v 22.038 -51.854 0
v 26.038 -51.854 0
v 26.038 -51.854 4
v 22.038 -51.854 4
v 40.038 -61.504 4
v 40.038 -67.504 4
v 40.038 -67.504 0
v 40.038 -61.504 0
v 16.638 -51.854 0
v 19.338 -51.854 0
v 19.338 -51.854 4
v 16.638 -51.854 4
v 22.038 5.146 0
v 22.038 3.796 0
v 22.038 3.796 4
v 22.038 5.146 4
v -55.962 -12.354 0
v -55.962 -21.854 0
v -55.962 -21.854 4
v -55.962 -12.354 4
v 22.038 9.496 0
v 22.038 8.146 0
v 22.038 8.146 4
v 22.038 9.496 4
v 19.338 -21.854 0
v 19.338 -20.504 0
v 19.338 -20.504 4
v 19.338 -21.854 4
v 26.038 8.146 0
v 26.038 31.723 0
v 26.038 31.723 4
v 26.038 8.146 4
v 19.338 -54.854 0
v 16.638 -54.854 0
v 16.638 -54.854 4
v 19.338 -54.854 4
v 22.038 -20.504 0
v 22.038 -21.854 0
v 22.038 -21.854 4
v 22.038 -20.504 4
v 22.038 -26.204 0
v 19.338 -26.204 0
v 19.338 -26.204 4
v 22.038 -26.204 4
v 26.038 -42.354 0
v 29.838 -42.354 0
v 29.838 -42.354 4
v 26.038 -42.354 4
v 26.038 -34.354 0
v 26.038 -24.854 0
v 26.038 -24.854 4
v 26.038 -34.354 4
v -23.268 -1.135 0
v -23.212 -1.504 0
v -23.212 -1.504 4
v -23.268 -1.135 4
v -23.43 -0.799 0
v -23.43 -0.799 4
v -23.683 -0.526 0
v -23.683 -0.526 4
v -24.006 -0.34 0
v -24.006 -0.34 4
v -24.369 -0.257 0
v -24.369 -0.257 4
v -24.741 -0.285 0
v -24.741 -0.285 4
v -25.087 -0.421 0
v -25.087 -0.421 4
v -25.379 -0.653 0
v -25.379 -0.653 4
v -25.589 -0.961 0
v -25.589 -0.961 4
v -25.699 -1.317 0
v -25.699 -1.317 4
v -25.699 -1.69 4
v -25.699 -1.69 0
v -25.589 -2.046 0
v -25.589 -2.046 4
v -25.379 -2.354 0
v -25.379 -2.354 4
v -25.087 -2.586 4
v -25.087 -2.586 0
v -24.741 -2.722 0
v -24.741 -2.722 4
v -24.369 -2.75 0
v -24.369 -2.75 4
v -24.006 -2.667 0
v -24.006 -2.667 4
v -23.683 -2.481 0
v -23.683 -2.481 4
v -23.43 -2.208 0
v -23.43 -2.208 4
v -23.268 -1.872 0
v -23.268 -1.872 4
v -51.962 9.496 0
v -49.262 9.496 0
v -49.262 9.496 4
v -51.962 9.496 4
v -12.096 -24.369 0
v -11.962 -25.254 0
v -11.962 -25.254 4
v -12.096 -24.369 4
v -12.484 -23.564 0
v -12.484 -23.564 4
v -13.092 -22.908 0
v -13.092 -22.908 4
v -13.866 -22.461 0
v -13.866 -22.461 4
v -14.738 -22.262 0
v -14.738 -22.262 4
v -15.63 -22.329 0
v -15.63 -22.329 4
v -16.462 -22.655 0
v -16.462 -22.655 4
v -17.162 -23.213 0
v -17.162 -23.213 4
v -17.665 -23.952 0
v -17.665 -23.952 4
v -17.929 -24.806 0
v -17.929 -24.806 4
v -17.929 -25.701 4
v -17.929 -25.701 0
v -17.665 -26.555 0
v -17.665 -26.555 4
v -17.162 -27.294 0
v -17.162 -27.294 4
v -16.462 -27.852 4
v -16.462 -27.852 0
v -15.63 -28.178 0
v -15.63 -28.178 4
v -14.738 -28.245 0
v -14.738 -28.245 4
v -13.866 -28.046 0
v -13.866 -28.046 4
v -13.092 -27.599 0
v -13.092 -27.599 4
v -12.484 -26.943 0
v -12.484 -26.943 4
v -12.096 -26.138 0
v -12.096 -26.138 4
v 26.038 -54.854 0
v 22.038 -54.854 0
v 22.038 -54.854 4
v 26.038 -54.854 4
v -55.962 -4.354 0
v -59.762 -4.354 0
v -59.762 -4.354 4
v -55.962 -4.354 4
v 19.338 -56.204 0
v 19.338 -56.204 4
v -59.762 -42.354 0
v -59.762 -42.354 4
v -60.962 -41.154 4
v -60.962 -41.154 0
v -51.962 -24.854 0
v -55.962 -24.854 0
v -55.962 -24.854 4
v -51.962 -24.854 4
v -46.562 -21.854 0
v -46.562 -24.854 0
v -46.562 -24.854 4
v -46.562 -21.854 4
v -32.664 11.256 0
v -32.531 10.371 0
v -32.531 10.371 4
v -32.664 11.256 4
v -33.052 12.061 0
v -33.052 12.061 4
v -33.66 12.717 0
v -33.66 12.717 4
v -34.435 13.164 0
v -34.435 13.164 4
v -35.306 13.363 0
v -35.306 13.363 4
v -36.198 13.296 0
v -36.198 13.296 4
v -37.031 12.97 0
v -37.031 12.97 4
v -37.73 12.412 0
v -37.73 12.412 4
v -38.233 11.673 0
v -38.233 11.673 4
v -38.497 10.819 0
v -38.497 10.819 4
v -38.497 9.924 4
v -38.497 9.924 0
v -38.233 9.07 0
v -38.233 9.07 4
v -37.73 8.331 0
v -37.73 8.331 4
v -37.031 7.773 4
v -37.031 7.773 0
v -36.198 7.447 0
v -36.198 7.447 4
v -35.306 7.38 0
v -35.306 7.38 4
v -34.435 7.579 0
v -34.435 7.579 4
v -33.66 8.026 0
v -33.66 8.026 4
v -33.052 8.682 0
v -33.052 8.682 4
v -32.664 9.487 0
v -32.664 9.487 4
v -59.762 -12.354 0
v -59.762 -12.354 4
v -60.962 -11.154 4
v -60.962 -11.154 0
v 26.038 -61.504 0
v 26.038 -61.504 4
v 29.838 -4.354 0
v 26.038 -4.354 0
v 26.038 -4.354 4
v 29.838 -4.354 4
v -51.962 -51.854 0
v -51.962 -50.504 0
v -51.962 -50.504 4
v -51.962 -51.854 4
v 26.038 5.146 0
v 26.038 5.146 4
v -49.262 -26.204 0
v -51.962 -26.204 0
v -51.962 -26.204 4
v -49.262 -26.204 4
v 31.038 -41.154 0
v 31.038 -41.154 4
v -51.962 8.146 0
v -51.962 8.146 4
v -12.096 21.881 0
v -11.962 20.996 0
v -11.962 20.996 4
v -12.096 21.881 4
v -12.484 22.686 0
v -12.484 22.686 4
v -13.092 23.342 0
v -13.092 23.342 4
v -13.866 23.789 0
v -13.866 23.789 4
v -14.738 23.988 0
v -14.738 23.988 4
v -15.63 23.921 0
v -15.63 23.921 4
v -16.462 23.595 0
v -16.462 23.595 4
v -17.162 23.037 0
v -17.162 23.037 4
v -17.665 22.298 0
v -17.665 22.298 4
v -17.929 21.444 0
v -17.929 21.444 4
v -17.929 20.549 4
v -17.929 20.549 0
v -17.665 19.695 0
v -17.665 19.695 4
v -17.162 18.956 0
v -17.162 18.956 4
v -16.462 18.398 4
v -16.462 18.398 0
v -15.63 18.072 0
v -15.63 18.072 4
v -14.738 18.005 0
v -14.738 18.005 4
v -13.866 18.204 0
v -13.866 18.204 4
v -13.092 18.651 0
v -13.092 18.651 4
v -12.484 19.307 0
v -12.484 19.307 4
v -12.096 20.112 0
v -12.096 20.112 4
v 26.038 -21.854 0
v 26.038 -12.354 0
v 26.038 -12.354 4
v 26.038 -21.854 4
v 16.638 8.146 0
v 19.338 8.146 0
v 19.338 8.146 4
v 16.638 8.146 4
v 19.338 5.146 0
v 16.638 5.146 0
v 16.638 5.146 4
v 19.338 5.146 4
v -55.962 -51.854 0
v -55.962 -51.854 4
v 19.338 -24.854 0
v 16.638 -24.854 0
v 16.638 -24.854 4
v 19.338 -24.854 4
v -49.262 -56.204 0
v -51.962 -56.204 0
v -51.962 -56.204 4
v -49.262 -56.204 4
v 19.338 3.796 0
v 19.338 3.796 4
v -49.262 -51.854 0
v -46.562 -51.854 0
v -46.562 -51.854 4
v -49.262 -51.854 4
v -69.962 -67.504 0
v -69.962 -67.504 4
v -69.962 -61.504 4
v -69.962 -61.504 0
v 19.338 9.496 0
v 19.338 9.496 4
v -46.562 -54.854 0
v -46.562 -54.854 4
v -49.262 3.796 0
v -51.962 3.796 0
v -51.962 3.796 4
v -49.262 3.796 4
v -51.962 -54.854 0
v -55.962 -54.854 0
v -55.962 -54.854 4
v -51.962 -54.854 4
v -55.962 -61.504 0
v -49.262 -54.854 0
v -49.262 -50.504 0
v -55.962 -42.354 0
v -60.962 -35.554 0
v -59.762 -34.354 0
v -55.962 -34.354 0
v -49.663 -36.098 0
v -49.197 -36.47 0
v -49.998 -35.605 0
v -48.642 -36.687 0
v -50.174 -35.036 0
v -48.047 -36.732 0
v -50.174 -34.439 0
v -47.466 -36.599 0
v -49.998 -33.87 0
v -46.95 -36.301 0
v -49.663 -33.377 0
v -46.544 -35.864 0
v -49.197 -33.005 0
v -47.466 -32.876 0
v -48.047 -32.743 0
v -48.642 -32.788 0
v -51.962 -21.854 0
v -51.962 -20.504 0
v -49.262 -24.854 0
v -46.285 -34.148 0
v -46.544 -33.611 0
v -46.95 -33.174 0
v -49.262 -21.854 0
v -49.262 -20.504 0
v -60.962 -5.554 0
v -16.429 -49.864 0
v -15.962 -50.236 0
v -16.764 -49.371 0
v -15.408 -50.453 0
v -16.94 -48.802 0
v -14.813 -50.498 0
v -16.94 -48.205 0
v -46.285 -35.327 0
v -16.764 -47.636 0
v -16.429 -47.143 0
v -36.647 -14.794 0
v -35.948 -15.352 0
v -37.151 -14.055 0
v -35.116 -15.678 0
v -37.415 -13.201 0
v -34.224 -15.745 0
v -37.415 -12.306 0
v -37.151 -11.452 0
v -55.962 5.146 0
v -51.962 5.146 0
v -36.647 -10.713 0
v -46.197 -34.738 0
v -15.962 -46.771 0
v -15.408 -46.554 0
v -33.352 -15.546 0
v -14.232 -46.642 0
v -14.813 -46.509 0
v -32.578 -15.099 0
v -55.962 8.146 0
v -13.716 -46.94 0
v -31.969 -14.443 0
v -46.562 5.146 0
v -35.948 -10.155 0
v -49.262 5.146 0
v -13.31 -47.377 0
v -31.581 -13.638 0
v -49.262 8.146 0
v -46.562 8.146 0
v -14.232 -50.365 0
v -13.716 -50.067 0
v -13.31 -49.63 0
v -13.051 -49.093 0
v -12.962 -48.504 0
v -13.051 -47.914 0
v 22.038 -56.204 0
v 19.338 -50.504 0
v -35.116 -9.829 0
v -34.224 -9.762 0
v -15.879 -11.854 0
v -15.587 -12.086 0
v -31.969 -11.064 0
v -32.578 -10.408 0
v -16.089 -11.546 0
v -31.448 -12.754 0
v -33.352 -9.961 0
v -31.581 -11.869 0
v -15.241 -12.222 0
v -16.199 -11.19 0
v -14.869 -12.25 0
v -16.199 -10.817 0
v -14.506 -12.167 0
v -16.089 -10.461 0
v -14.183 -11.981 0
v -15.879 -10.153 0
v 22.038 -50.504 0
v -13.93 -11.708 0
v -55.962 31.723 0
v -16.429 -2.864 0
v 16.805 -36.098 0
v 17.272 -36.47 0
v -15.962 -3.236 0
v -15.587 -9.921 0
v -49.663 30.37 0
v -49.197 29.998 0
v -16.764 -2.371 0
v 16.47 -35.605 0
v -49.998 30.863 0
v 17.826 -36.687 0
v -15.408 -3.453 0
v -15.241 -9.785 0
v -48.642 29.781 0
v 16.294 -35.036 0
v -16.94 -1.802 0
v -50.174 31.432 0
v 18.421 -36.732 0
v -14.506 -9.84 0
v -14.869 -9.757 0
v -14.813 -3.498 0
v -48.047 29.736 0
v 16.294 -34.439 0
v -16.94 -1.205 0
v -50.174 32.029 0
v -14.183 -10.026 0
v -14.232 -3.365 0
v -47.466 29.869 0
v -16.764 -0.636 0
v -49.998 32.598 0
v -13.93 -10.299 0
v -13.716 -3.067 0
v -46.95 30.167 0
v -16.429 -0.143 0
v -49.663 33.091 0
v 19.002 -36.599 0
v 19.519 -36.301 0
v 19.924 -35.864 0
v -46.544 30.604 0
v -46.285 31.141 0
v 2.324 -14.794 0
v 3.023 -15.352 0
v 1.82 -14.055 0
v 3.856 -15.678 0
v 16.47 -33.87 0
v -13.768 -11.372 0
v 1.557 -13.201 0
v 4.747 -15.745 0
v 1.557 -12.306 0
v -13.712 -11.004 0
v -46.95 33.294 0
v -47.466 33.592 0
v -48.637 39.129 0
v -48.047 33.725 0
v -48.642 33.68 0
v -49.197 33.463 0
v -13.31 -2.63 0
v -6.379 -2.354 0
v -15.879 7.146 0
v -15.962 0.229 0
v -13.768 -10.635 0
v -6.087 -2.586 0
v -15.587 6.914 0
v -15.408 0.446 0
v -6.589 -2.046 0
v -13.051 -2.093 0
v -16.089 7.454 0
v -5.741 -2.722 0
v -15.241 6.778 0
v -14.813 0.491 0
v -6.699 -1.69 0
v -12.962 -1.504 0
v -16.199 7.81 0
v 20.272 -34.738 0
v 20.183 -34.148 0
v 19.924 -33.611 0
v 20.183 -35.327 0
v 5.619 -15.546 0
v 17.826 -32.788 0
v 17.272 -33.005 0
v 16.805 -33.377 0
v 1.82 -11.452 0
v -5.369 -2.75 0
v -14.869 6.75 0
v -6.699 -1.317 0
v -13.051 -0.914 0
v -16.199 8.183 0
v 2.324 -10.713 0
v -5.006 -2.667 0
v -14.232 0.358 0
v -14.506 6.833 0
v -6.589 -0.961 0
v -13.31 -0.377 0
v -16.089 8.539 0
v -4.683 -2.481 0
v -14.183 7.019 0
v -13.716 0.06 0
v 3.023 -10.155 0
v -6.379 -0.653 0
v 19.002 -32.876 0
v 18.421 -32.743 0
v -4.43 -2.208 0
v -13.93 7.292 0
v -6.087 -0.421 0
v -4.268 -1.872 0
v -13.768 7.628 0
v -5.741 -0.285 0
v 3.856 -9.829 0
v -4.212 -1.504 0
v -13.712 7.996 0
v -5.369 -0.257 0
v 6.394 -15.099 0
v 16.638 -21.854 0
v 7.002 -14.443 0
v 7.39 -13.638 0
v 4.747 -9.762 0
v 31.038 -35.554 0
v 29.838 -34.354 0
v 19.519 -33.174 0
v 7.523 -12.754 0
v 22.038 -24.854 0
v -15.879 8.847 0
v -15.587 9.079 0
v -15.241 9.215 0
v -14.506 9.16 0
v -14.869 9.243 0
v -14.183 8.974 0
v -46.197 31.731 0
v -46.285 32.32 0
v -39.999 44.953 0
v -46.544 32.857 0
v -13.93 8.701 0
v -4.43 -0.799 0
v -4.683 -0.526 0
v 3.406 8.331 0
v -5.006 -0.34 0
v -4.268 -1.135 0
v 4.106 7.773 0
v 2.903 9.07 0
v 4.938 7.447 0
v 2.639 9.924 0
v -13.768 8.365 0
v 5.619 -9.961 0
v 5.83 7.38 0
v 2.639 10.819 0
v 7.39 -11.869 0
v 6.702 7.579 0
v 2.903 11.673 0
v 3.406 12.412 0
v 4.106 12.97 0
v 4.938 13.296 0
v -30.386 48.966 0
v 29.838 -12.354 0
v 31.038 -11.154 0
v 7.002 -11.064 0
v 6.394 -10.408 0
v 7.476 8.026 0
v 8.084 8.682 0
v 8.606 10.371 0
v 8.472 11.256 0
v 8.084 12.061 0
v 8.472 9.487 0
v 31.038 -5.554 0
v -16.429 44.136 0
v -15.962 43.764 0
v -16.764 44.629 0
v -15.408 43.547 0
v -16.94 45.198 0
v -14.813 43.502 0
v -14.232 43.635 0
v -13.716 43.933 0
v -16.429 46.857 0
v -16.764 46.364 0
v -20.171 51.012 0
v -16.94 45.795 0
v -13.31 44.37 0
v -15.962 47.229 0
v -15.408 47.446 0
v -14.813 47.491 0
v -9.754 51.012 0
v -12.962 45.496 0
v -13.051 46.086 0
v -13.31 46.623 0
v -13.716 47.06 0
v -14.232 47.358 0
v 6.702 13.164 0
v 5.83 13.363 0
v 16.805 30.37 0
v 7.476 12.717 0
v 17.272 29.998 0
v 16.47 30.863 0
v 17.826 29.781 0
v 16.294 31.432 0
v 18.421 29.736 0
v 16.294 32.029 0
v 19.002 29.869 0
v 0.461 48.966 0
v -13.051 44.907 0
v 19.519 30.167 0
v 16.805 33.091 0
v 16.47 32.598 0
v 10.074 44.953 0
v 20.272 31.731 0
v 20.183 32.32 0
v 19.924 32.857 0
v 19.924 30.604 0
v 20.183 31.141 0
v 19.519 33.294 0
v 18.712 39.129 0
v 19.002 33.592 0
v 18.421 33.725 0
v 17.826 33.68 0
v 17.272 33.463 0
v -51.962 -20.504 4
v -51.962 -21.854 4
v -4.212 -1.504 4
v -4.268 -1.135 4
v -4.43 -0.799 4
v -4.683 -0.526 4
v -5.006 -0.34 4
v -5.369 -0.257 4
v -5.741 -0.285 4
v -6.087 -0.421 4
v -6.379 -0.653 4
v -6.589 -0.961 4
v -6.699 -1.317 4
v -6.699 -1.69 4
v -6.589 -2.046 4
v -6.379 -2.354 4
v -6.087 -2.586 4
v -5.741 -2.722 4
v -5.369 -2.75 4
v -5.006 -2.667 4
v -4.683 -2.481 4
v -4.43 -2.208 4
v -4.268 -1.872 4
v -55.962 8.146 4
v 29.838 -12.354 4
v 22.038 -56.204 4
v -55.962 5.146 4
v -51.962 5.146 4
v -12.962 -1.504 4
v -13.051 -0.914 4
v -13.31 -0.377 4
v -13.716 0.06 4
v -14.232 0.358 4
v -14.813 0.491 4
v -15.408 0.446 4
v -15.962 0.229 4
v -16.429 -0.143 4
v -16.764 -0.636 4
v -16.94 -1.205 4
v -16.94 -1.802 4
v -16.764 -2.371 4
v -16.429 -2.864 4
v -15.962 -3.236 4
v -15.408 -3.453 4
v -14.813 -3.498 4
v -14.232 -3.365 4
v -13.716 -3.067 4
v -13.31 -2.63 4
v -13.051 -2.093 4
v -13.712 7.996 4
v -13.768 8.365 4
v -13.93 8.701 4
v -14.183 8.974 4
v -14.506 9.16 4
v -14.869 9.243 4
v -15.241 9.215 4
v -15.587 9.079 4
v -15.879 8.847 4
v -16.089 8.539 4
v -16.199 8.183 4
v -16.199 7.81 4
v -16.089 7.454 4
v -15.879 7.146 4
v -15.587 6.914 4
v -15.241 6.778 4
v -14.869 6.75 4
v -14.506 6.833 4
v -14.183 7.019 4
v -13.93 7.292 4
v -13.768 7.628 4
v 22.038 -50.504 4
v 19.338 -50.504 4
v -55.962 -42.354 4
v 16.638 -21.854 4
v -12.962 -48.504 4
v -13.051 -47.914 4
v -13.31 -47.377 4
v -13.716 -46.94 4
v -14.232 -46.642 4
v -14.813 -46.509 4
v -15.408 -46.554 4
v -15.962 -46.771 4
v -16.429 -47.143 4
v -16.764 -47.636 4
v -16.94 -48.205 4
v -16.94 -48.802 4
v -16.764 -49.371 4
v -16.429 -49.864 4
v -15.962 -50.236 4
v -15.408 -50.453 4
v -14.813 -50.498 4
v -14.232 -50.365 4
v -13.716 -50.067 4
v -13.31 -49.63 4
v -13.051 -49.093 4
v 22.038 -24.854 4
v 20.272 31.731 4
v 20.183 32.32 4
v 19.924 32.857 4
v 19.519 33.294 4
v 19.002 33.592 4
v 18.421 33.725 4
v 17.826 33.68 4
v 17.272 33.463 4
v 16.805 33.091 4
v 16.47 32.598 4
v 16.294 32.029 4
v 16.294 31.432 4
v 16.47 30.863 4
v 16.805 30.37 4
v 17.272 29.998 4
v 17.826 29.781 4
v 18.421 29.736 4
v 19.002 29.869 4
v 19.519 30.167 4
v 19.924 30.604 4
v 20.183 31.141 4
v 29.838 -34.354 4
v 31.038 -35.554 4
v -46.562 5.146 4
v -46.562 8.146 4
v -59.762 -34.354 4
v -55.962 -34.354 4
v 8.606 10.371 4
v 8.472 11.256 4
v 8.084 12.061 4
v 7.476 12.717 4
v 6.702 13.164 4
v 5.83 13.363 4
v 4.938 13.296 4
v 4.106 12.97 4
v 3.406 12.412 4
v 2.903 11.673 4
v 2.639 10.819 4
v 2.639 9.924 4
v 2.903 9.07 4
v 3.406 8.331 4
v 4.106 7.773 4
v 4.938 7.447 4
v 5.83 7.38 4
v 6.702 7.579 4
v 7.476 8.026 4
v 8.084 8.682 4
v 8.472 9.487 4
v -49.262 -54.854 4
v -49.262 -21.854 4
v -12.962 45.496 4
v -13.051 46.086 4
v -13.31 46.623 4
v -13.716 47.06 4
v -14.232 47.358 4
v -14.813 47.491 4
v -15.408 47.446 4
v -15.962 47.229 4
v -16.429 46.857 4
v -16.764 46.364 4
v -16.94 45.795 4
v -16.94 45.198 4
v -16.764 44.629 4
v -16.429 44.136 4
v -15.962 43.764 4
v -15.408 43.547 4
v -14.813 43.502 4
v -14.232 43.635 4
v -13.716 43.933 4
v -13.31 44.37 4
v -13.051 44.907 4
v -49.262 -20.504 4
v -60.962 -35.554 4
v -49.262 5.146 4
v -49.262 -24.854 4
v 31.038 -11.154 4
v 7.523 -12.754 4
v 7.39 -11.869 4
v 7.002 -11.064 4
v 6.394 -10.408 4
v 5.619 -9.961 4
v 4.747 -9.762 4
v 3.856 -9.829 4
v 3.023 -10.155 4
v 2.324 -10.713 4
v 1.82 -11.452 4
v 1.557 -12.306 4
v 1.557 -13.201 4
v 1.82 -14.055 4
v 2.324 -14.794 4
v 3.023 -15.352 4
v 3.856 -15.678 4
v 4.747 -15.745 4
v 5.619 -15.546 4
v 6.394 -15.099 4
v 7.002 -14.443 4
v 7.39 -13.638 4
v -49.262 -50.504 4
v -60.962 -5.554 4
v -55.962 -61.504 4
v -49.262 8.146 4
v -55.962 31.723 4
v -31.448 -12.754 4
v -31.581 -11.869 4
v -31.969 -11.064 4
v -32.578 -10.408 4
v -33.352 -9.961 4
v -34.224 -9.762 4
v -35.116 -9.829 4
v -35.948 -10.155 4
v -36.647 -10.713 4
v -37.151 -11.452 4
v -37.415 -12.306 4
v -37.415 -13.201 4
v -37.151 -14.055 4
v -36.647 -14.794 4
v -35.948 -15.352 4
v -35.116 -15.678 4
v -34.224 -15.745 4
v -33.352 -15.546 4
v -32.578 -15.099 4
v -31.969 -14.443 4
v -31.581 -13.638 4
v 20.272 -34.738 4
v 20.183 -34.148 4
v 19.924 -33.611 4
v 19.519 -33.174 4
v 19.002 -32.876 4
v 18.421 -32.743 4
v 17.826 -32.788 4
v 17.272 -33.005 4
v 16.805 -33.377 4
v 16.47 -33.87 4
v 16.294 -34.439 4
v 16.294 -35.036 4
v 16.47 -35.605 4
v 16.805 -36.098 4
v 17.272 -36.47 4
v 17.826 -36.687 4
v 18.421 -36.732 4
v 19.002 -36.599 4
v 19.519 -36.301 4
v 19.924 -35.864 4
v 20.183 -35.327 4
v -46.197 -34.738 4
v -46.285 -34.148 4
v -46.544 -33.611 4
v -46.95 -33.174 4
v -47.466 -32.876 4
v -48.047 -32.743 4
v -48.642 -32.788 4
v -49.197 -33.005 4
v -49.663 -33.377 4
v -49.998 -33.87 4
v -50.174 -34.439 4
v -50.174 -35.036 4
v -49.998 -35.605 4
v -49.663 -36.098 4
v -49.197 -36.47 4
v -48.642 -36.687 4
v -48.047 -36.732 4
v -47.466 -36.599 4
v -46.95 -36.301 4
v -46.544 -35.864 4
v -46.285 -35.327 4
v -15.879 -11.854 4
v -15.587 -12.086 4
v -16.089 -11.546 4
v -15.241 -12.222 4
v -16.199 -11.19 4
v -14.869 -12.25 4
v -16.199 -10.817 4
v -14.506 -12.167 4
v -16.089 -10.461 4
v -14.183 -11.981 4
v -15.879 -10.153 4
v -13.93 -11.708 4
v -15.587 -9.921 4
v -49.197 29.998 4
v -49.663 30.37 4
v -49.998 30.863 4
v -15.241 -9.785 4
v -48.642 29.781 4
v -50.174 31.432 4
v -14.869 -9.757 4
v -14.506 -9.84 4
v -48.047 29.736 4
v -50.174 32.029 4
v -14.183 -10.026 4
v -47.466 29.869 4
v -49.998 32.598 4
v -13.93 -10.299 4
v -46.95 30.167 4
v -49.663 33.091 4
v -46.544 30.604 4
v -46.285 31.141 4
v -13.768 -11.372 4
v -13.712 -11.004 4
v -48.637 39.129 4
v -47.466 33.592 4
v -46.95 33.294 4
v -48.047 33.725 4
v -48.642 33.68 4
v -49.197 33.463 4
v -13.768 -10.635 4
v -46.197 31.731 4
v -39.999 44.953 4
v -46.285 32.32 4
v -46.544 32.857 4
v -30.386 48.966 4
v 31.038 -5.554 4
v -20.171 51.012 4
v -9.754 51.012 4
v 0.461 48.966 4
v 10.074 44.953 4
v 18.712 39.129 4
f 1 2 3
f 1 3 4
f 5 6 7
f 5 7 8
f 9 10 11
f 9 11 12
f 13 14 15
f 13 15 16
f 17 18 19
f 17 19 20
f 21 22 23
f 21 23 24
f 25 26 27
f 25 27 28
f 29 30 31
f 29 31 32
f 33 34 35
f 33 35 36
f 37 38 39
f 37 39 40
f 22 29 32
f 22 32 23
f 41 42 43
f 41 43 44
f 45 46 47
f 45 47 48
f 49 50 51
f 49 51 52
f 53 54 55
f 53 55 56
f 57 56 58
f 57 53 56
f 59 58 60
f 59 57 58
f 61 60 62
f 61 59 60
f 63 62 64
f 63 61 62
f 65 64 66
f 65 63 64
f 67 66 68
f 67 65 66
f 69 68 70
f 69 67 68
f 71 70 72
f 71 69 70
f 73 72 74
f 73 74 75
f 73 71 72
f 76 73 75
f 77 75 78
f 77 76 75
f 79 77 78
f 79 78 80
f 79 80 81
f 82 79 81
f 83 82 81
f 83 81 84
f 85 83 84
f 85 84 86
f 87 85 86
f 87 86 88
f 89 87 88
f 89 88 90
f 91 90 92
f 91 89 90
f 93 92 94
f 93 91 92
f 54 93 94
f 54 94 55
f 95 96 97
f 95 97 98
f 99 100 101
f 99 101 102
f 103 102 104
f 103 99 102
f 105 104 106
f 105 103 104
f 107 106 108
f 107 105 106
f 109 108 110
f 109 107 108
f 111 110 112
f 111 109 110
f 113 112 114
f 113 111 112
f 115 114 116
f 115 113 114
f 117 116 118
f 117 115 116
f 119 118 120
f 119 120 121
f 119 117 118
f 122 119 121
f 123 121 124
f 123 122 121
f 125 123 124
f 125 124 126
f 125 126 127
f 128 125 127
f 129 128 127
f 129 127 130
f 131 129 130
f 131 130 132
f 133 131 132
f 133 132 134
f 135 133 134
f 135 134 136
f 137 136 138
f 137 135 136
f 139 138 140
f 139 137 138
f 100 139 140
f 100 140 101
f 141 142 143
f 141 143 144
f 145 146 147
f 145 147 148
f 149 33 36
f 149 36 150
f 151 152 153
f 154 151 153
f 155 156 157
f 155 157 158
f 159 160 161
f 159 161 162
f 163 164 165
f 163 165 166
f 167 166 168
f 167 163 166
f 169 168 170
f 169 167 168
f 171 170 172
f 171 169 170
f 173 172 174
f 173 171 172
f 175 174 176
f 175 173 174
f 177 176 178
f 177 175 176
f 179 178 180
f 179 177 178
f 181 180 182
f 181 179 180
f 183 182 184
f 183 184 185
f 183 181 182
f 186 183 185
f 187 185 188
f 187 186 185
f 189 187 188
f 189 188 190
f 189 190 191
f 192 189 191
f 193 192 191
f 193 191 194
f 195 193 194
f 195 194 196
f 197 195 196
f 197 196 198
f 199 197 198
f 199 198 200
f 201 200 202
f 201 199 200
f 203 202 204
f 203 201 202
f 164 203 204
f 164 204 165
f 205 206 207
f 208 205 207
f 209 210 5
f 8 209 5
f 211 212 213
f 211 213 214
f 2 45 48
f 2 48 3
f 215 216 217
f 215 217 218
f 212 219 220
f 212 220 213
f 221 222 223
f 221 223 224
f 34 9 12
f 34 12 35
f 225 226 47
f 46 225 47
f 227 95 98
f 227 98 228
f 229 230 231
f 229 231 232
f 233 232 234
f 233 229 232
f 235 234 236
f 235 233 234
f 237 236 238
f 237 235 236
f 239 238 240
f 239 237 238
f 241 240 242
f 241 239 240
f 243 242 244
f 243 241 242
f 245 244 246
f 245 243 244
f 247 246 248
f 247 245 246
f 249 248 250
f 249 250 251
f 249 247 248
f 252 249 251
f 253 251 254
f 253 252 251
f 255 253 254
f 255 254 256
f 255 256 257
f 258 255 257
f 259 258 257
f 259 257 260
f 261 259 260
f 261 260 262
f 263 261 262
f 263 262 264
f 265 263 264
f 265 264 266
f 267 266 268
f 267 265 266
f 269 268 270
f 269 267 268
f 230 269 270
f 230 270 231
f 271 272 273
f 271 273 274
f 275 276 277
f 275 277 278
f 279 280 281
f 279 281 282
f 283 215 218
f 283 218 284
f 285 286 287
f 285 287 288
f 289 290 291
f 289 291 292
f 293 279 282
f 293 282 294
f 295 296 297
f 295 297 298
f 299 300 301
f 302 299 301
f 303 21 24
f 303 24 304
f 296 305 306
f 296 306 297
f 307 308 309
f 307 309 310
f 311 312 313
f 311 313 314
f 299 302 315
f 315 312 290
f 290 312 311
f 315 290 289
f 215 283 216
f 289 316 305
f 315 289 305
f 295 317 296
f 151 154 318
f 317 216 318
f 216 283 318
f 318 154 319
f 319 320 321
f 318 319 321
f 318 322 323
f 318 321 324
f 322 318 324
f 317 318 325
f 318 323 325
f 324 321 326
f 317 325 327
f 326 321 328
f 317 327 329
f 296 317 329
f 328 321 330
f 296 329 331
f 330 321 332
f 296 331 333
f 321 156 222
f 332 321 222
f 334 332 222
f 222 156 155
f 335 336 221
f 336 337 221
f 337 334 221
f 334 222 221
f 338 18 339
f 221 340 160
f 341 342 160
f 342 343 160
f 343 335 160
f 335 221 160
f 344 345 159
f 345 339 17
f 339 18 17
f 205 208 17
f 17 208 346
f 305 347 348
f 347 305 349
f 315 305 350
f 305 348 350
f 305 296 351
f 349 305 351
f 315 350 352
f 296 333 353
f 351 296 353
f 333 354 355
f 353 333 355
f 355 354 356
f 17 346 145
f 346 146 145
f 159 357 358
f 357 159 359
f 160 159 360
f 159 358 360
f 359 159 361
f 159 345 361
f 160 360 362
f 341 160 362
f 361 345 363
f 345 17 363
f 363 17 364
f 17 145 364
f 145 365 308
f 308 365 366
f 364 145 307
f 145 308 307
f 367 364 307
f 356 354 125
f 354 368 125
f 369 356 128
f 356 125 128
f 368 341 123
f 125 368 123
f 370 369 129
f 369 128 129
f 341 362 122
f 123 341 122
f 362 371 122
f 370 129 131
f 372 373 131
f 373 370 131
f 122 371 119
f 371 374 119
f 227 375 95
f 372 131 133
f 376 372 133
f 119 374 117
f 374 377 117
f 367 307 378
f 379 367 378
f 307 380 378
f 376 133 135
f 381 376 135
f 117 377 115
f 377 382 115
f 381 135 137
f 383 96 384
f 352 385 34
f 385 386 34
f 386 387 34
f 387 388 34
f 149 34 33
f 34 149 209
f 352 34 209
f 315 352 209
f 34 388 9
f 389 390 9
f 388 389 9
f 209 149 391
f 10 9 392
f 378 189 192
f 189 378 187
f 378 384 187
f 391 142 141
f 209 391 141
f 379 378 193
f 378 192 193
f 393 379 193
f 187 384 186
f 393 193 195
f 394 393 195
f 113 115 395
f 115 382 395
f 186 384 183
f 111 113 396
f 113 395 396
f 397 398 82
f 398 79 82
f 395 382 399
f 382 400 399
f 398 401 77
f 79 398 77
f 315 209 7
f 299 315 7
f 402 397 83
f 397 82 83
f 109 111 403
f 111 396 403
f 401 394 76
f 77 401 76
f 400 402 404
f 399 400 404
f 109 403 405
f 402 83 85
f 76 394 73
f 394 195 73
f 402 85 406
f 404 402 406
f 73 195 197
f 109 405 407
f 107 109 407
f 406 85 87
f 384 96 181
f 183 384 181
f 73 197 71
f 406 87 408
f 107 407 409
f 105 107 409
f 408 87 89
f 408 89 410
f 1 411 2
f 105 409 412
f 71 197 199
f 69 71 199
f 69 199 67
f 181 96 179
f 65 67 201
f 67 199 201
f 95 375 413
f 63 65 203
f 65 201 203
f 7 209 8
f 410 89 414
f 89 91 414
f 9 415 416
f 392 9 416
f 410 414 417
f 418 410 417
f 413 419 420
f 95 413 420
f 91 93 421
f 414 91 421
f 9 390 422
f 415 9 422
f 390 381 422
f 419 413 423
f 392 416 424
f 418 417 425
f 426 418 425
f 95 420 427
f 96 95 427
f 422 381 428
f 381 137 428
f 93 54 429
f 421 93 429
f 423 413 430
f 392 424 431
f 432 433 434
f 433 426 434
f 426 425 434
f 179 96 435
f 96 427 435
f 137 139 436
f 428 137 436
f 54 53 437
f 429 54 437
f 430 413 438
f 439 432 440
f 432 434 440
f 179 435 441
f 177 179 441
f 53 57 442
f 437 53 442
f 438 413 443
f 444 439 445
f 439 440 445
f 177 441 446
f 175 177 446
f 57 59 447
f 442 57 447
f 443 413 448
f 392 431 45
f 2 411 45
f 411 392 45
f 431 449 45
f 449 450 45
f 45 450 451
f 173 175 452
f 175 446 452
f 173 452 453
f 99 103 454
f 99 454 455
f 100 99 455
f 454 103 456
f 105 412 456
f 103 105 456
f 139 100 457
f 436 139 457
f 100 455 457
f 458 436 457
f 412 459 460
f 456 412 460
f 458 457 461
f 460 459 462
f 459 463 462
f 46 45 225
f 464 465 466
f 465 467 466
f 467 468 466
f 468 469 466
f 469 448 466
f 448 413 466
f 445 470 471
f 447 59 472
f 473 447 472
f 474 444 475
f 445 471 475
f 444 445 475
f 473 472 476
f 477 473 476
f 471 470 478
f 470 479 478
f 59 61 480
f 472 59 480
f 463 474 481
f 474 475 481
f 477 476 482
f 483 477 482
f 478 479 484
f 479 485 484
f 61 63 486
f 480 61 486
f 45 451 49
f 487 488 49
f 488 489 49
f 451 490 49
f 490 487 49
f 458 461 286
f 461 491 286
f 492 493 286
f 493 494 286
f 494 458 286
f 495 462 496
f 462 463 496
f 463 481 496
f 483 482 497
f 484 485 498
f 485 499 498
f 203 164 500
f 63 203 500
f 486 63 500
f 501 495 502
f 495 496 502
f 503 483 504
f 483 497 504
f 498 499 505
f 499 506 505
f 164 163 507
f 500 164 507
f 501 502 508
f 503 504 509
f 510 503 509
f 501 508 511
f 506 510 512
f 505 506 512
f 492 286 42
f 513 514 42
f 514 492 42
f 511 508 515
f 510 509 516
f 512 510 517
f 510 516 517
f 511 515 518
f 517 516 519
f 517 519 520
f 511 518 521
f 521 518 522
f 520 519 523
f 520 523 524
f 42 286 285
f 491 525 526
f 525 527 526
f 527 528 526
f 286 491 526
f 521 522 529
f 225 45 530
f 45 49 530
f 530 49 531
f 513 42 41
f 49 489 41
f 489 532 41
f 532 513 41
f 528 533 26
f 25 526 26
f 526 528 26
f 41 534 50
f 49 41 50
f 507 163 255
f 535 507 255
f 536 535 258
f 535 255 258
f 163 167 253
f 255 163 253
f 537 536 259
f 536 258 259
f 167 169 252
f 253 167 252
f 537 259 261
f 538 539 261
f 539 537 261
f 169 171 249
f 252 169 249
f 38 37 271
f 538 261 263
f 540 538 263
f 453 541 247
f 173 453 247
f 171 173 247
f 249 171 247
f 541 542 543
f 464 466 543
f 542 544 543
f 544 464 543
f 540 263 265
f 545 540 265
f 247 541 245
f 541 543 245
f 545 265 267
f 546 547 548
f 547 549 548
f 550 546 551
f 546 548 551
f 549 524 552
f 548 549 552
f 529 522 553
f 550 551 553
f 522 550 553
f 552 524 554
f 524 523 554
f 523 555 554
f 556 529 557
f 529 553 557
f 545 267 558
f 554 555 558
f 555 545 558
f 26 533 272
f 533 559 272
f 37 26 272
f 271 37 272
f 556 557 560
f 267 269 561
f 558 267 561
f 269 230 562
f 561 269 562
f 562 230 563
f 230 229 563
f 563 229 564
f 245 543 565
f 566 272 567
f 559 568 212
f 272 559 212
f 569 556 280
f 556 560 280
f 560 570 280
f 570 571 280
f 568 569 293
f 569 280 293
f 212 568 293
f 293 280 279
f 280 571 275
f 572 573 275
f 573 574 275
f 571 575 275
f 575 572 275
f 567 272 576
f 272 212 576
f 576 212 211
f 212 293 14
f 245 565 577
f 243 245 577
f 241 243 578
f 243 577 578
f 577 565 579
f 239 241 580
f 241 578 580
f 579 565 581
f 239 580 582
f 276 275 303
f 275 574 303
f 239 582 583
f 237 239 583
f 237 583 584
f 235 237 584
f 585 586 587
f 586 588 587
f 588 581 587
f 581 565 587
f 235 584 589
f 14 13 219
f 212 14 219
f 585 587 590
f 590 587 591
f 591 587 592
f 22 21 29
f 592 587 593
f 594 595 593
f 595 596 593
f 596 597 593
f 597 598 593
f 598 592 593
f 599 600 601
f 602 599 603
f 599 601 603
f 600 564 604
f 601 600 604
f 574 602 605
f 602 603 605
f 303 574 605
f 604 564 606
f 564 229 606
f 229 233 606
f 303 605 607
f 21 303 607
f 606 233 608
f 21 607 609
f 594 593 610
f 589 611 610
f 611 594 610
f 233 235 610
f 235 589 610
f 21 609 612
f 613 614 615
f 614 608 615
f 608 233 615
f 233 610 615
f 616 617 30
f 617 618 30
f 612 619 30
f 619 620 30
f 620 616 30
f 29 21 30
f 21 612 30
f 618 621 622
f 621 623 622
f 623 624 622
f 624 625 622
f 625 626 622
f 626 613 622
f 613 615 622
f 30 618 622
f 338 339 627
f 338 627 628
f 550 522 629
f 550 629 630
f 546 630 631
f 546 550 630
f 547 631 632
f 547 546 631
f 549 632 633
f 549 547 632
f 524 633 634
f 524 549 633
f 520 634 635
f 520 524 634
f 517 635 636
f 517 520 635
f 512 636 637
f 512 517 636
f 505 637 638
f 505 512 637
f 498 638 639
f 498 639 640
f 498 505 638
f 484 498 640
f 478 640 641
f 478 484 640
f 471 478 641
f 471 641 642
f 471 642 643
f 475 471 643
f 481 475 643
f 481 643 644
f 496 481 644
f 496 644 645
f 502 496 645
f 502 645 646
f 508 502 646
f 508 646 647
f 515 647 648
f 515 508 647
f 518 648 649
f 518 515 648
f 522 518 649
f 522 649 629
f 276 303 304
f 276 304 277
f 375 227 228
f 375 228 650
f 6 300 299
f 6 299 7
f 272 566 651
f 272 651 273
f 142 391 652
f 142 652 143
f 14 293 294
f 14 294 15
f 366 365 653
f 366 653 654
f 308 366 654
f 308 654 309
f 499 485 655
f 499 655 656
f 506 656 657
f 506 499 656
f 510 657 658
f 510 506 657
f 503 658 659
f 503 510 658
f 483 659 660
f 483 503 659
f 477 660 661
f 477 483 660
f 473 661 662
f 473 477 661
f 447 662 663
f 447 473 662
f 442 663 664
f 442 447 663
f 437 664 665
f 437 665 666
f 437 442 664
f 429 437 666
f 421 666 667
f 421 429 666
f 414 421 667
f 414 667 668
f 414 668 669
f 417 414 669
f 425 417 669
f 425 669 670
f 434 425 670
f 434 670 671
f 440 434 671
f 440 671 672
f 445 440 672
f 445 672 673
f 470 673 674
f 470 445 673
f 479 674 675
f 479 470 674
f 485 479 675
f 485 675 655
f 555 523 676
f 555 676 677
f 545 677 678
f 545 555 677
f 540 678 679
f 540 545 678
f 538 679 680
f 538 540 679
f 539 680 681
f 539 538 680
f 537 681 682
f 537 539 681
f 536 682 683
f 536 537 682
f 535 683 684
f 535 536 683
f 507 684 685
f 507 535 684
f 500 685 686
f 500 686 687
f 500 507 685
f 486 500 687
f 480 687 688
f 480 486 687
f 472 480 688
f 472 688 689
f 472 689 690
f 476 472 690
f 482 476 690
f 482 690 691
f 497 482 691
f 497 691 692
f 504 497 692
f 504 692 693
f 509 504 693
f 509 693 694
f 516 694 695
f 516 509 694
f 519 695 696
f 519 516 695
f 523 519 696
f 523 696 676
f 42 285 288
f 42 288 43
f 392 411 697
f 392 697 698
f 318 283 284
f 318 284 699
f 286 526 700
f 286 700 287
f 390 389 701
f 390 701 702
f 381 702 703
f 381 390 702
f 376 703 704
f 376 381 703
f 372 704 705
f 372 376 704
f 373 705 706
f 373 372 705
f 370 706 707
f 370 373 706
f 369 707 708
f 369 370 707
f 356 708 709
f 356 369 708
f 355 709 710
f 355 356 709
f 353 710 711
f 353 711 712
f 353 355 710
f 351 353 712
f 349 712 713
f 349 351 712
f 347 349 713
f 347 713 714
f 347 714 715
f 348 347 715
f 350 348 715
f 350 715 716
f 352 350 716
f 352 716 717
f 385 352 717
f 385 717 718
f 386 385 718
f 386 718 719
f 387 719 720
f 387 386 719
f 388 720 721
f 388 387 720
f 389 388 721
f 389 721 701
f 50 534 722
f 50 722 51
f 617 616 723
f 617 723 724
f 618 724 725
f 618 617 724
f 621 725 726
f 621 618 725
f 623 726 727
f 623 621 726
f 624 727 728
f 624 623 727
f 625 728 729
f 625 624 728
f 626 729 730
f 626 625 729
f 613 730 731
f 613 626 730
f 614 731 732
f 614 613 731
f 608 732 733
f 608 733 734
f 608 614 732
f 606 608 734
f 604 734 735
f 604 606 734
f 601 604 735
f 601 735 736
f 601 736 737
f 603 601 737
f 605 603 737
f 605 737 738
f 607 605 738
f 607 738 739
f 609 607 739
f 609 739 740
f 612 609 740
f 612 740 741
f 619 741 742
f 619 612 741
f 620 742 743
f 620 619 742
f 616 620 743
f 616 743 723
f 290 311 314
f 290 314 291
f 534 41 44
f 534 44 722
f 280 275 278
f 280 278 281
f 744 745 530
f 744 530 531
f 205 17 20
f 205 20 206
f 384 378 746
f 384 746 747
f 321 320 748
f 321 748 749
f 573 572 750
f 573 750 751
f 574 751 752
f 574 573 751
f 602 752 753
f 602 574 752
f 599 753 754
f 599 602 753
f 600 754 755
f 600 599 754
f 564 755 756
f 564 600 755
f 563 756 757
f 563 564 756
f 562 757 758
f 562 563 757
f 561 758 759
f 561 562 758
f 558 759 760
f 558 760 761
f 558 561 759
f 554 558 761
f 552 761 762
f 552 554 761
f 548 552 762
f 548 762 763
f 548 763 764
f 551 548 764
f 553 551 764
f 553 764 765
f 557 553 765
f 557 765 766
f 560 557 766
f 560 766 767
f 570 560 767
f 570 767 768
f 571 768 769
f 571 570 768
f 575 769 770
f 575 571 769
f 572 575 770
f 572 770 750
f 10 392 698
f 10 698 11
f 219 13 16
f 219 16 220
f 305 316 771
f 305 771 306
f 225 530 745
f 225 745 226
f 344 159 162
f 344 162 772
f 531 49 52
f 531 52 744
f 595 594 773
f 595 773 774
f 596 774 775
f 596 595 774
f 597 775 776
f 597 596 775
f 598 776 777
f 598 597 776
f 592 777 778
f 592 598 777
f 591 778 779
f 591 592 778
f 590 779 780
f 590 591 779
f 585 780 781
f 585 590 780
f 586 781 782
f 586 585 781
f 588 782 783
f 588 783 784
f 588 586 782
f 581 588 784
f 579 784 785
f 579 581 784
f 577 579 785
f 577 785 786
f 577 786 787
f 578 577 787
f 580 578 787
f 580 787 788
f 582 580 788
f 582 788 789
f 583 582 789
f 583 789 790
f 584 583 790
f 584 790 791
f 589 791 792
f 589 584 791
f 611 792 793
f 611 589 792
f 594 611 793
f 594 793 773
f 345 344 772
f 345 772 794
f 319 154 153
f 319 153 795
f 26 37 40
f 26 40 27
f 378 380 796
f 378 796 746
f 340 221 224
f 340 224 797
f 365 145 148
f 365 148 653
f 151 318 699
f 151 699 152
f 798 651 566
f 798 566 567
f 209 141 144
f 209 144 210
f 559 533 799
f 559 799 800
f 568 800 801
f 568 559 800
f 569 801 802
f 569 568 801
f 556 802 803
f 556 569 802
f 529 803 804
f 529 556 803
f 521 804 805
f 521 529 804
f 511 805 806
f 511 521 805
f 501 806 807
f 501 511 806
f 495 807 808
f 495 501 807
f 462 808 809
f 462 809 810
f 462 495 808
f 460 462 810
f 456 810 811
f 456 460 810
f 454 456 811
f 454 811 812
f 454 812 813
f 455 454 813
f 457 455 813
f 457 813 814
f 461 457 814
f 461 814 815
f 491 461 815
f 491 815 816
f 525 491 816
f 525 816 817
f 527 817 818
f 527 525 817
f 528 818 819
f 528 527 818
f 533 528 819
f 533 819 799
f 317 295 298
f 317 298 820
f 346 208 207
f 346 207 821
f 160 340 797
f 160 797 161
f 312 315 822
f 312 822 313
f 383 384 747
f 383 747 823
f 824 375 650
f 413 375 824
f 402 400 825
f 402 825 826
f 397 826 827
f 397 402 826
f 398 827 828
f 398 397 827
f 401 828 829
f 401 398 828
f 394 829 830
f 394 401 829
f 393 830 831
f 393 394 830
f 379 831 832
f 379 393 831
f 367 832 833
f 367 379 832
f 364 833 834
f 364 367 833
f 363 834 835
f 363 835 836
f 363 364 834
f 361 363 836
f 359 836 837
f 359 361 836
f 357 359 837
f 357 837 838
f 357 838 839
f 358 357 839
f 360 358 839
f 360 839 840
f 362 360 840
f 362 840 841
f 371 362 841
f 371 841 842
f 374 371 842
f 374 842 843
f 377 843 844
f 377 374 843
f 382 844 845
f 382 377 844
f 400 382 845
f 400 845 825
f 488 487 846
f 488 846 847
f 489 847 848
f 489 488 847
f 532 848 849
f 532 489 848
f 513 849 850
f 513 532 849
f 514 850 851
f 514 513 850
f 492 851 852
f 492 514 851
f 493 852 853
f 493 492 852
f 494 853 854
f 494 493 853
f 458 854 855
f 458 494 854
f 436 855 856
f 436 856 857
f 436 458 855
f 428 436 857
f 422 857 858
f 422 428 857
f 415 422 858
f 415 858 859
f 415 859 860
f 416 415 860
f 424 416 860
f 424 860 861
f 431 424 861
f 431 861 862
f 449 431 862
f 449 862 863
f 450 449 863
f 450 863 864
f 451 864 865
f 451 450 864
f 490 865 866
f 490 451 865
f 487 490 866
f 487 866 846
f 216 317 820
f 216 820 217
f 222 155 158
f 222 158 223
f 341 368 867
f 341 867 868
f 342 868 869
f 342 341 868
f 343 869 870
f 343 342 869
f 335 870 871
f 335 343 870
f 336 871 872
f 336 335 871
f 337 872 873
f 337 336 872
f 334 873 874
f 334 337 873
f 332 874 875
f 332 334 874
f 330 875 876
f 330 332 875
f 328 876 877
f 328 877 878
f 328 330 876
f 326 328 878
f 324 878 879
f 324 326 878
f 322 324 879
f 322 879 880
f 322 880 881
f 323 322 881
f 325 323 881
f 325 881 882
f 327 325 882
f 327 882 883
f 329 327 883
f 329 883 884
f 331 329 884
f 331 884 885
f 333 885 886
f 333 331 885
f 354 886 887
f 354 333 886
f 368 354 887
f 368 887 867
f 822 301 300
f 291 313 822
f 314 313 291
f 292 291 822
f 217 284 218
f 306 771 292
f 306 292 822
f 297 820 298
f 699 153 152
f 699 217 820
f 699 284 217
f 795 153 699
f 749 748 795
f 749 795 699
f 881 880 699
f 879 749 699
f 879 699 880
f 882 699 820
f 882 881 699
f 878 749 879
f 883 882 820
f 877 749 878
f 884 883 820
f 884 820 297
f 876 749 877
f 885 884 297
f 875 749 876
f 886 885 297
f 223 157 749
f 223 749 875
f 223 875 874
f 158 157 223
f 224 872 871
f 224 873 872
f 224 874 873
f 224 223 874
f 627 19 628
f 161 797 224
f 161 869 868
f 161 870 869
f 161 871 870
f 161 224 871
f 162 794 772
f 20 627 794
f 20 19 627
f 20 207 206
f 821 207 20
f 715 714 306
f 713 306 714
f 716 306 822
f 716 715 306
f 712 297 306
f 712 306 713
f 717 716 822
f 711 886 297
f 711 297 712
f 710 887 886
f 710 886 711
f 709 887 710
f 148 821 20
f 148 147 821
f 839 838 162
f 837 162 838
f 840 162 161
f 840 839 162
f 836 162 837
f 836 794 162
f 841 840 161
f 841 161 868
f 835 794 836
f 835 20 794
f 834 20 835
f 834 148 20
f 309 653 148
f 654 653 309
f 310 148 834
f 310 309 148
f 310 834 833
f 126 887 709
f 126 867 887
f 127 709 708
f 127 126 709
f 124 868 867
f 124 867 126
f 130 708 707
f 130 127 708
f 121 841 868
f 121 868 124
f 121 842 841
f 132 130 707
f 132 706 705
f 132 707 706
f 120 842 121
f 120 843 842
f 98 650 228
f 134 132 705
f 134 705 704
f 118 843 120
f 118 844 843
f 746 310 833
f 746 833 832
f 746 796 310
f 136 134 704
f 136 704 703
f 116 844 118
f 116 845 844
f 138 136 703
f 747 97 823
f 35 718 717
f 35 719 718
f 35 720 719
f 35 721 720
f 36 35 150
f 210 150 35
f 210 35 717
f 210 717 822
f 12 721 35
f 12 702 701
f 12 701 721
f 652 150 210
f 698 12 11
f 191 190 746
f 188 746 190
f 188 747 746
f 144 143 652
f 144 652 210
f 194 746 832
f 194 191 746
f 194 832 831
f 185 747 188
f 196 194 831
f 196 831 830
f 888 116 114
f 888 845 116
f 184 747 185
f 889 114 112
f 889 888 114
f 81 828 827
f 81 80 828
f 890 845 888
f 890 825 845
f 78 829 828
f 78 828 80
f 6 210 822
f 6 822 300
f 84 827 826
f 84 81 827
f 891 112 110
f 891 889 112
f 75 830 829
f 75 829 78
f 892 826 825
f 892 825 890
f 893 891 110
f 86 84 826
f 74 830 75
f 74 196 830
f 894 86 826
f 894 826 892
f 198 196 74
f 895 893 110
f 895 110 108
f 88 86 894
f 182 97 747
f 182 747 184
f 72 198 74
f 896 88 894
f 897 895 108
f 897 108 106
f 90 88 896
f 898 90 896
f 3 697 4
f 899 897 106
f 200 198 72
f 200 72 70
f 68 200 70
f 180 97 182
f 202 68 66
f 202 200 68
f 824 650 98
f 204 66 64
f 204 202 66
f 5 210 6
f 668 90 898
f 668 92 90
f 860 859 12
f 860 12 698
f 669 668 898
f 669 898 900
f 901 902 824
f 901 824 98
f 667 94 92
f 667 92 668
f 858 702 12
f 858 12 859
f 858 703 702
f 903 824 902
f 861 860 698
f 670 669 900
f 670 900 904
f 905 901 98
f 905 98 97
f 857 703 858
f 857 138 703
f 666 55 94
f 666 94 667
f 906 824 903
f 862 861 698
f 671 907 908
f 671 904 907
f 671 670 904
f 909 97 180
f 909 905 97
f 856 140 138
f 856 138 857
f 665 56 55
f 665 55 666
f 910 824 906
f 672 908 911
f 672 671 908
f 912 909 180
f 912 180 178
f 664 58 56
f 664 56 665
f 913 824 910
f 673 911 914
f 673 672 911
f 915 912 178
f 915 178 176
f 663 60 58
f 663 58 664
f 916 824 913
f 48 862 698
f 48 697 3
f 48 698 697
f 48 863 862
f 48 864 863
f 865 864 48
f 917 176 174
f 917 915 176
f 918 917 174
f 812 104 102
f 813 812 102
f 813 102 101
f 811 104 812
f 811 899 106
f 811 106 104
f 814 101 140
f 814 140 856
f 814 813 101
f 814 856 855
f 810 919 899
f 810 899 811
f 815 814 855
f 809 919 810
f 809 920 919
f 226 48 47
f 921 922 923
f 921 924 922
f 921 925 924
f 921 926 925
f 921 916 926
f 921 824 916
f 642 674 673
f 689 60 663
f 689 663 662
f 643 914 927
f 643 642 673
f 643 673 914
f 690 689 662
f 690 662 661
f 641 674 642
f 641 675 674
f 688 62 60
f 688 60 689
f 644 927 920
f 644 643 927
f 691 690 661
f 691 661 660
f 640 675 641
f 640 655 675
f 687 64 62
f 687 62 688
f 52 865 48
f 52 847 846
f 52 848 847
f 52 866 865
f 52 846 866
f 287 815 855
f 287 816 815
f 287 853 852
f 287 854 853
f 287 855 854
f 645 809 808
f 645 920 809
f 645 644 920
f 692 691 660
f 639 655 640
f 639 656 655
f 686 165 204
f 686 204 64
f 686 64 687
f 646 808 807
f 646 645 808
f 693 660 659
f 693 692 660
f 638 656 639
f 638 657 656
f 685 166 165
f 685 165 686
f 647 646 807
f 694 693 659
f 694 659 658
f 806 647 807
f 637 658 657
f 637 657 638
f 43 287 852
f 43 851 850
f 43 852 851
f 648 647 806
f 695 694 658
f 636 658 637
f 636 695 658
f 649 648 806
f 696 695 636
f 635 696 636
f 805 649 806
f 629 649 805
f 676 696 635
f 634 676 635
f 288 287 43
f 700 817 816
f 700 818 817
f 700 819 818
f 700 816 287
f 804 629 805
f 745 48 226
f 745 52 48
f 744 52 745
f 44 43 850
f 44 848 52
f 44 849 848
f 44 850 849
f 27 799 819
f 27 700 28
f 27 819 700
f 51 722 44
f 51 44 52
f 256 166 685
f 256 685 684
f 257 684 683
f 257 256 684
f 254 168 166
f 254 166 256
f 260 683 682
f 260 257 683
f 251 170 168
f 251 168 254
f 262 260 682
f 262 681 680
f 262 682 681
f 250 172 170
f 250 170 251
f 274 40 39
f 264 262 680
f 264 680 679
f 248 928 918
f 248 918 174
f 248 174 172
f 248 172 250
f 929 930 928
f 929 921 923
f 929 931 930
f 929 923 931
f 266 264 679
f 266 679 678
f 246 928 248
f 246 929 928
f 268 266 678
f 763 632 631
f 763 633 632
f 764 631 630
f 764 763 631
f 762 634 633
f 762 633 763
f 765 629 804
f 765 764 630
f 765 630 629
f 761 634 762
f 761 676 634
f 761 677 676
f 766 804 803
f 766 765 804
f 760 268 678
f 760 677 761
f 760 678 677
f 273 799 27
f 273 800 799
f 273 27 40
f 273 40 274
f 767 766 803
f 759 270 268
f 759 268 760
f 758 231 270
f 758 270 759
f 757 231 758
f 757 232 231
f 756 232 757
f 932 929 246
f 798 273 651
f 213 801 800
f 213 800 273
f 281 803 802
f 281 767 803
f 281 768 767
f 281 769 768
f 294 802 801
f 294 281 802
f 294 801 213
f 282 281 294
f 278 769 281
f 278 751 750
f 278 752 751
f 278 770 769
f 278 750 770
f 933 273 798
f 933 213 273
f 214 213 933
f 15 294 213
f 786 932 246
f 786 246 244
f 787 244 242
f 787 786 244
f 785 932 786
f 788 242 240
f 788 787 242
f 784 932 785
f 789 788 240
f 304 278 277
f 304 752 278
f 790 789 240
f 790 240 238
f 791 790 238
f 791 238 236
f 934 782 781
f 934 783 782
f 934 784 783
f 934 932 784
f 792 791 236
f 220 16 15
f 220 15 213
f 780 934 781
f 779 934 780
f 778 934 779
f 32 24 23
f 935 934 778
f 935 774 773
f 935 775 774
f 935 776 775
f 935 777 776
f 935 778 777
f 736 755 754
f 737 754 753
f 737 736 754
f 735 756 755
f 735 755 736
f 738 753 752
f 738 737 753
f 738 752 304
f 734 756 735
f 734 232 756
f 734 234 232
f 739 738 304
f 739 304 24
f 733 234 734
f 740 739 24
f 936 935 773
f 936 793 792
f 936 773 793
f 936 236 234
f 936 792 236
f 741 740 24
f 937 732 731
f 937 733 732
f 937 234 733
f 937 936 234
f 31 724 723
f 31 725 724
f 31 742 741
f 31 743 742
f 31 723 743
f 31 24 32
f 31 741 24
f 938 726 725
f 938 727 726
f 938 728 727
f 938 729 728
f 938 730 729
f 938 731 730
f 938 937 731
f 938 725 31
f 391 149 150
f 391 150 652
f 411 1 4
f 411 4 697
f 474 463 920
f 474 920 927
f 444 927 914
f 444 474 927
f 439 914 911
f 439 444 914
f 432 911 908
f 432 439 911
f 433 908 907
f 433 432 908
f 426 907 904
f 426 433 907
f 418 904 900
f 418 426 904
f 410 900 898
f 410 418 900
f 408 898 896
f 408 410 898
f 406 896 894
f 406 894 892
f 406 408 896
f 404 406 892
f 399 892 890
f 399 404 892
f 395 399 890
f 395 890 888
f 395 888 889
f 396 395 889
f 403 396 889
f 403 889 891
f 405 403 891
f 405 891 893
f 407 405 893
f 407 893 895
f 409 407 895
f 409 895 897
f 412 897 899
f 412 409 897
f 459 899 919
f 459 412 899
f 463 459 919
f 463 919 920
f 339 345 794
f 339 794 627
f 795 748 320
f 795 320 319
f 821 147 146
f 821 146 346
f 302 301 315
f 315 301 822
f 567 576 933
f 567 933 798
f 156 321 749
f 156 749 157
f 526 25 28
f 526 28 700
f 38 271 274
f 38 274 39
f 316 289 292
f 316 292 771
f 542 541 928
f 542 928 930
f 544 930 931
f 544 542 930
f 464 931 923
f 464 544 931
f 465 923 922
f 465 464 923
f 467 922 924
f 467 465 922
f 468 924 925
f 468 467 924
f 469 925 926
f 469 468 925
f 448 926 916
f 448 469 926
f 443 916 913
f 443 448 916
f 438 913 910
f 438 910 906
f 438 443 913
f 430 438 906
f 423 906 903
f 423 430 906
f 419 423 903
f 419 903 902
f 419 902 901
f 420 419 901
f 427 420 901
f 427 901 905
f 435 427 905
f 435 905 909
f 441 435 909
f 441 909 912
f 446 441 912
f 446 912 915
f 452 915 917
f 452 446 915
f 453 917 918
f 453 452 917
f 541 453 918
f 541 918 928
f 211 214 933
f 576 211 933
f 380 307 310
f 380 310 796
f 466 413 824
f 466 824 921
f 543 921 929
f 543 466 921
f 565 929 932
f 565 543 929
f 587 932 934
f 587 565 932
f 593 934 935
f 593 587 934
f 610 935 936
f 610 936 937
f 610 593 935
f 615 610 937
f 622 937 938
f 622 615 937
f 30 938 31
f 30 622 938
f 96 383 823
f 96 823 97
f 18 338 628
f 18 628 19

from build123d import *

# Parameters (mm, degrees)
SKETCH_1_R          = 3
SKETCH_1_R_2        = 2
SKETCH_1_R_3        = 1.25
EXTRUDE_2_DEPTH     = 4
SKETCH_4_W          = 110
SKETCH_4_H          = 6
EXTRUDE_3_DEPTH     = 4
CUT_EXTRUDE_1_DEPTH = 4


with BuildPart() as part:
    # 草图1 → 凸台-拉伸2 (new body)
    with BuildSketch(Plane.XY):
        with BuildLine():
            Line((26.037512023, -61.503506411), (-55.962487977, -61.503506411))
            Line((-55.962487977, -61.503506411), (-55.962487977, -54.853506411))
            Line((-55.962487977, -54.853506411), (-51.962487977, -54.853506411))
            Line((-51.962487977, -54.853506411), (-51.962487977, -56.203506411))
            Line((-51.962487977, -56.203506411), (-49.262487977, -56.203506411))
            Line((-49.262487977, -56.203506411), (-49.262487977, -54.853506411))
            Line((-49.262487977, -54.853506411), (-46.562487977, -54.853506411))
            Line((-46.562487977, -54.853506411), (-46.562487977, -51.853506411))
            Line((-46.562487977, -51.853506411), (-49.262487977, -51.853506411))
            Line((-49.262487977, -51.853506411), (-49.262487977, -50.503506411))
            Line((-49.262487977, -50.503506411), (-51.962487977, -50.503506411))
            Line((-51.962487977, -50.503506411), (-51.962487977, -51.853506411))
            Line((-51.962487977, -51.853506411), (-55.962487977, -51.853506411))
            Line((-55.962487977, -51.853506411), (-55.962487977, -42.353506411))
            Line((-55.962487977, -42.353506411), (-60.962487977, -42.353506411))
            Line((-60.962487977, -42.353506411), (-60.962487977, -34.353506411))
            Line((-60.962487977, -34.353506411), (-55.962487977, -34.353506411))
            Line((-55.962487977, -34.353506411), (-55.962487977, -24.853506411))
            Line((-55.962487977, -24.853506411), (-51.962487977, -24.853506411))
            Line((-51.962487977, -24.853506411), (-51.962487977, -26.203506411))
            Line((-51.962487977, -26.203506411), (-49.262487977, -26.203506411))
            Line((-49.262487977, -26.203506411), (-49.262487977, -24.853506411))
            Line((-49.262487977, -24.853506411), (-46.562487977, -24.853506411))
            Line((-46.562487977, -24.853506411), (-46.562487977, -21.853506411))
            Line((-46.562487977, -21.853506411), (-49.262487977, -21.853506411))
            Line((-49.262487977, -21.853506411), (-49.262487977, -20.503506411))
            Line((-49.262487977, -20.503506411), (-51.962487977, -20.503506411))
            Line((-51.962487977, -20.503506411), (-51.962487977, -21.853506411))
            Line((-51.962487977, -21.853506411), (-55.962487977, -21.853506411))
            Line((-55.962487977, -21.853506411), (-55.962487977, -12.353506411))
            Line((-55.962487977, -12.353506411), (-60.962487977, -12.353506411))
            Line((-60.962487977, -12.353506411), (-60.962487977, -4.353506411))
            Line((-60.962487977, -4.353506411), (-55.962487977, -4.353506411))
            Line((-55.962487977, -4.353506411), (-55.962487977, 5.146493589))
            Line((-55.962487977, 5.146493589), (-51.962487977, 5.146493589))
            Line((-51.962487977, 5.146493589), (-51.962487977, 3.796493589))
            Line((-51.962487977, 3.796493589), (-49.262487977, 3.796493589))
            Line((-49.262487977, 3.796493589), (-49.262487977, 5.146493589))
            Line((-49.262487977, 5.146493589), (-46.562487977, 5.146493589))
            Line((-46.562487977, 5.146493589), (-46.562487977, 8.146493589))
            Line((-46.562487977, 8.146493589), (-49.262487977, 8.146493589))
            Line((-49.262487977, 8.146493589), (-49.262487977, 9.496493589))
            Line((-49.262487977, 9.496493589), (-51.962487977, 9.496493589))
            Line((-51.962487977, 9.496493589), (-51.962487977, 8.146493589))
            Line((-51.962487977, 8.146493589), (-55.962487977, 8.146493589))
            Line((-55.962487977, 8.146493589), (-55.962487977, 23.496493589))
            Line((-55.962487977, 23.496493589), (-55.962487977, 31.722989041))
            ThreePointArc((-55.962487977, 31.722989041), (-14.962487977, 51.269592797), (26.037512023, 31.722989041))
            Line((26.037512023, 31.722989041), (26.037512023, 23.496493589))
            Line((26.037512023, 23.496493589), (26.037512023, 8.146493589))
            Line((26.037512023, 8.146493589), (22.037512023, 8.146493589))
            Line((22.037512023, 8.146493589), (22.037512023, 9.496493589))
            Line((22.037512023, 9.496493589), (19.337512023, 9.496493589))
            Line((19.337512023, 9.496493589), (19.337512023, 8.146493589))
            Line((19.337512023, 8.146493589), (16.637512023, 8.146493589))
            Line((16.637512023, 8.146493589), (16.637512023, 5.146493589))
            Line((16.637512023, 5.146493589), (19.337512023, 5.146493589))
            Line((19.337512023, 5.146493589), (19.337512023, 3.796493589))
            Line((19.337512023, 3.796493589), (22.037512023, 3.796493589))
            Line((22.037512023, 3.796493589), (22.037512023, 5.146493589))
            Line((22.037512023, 5.146493589), (26.037512023, 5.146493589))
            Line((26.037512023, 5.146493589), (26.037512023, -4.353506411))
            Line((26.037512023, -4.353506411), (31.037512023, -4.353506411))
            Line((31.037512023, -4.353506411), (31.037512023, -12.353506411))
            Line((31.037512023, -12.353506411), (26.037512023, -12.353506411))
            Line((26.037512023, -12.353506411), (26.037512023, -21.853506411))
            Line((26.037512023, -21.853506411), (22.037512023, -21.853506411))
            Line((22.037512023, -21.853506411), (22.037512023, -20.503506411))
            Line((22.037512023, -20.503506411), (19.337512023, -20.503506411))
            Line((19.337512023, -20.503506411), (19.337512023, -21.853506411))
            Line((19.337512023, -21.853506411), (16.637512023, -21.853506411))
            Line((16.637512023, -21.853506411), (16.637512023, -24.853506411))
            Line((16.637512023, -24.853506411), (19.337512023, -24.853506411))
            Line((19.337512023, -24.853506411), (19.337512023, -26.203506411))
            Line((19.337512023, -26.203506411), (22.037512023, -26.203506411))
            Line((22.037512023, -26.203506411), (22.037512023, -24.853506411))
            Line((22.037512023, -24.853506411), (26.037512023, -24.853506411))
            Line((26.037512023, -24.853506411), (26.037512023, -34.353506411))
            Line((26.037512023, -34.353506411), (31.037512023, -34.353506411))
            Line((31.037512023, -34.353506411), (31.037512023, -42.353506411))
            Line((31.037512023, -42.353506411), (26.037512023, -42.353506411))
            Line((26.037512023, -42.353506411), (26.037512023, -51.853506411))
            Line((26.037512023, -51.853506411), (22.037512023, -51.853506411))
            Line((22.037512023, -51.853506411), (22.037512023, -50.503506411))
            Line((22.037512023, -50.503506411), (19.337512023, -50.503506411))
            Line((19.337512023, -50.503506411), (19.337512023, -51.853506411))
            Line((19.337512023, -51.853506411), (16.637512023, -51.853506411))
            Line((16.637512023, -51.853506411), (16.637512023, -54.853506411))
            Line((16.637512023, -54.853506411), (19.337512023, -54.853506411))
            Line((19.337512023, -54.853506411), (19.337512023, -56.203506411))
            Line((19.337512023, -56.203506411), (22.037512023, -56.203506411))
            Line((22.037512023, -56.203506411), (22.037512023, -54.853506411))
            Line((22.037512023, -54.853506411), (26.037512023, -54.853506411))
            Line((26.037512023, -54.853506411), (26.037512023, -61.503506411))
        make_face()
        with Locations((-14.962487977, -25.253506411)):
            Circle(SKETCH_1_R, mode=Mode.SUBTRACT)
        with Locations((4.523083608, -12.753506411)):
            Circle(SKETCH_1_R, mode=Mode.SUBTRACT)
        with Locations((-14.962487977, -1.503506411)):
            Circle(SKETCH_1_R_2, mode=Mode.SUBTRACT)
        with Locations((-35.530591317, 10.371493589)):
            Circle(SKETCH_1_R, mode=Mode.SUBTRACT)
        with Locations((-34.448059562, -12.753506411)):
            Circle(SKETCH_1_R, mode=Mode.SUBTRACT)
        with Locations((5.605615363, 10.371493589)):
            Circle(SKETCH_1_R, mode=Mode.SUBTRACT)
        with Locations((-14.962487977, 20.996493589)):
            Circle(SKETCH_1_R, mode=Mode.SUBTRACT)
        with Locations((18.271530739, -34.737525127)):
            Circle(SKETCH_1_R_2, mode=Mode.SUBTRACT)
        with Locations((-14.962487977, -48.503506411)):
            Circle(SKETCH_1_R_2, mode=Mode.SUBTRACT)
        with Locations((-48.196506692, -34.737525127)):
            Circle(SKETCH_1_R_2, mode=Mode.SUBTRACT)
        with Locations((-48.196506692, 31.730512305)):
            Circle(SKETCH_1_R_2, mode=Mode.SUBTRACT)
        with Locations((-14.962487977, 45.496493589)):
            Circle(SKETCH_1_R_2, mode=Mode.SUBTRACT)
        with Locations((18.271530739, 31.730512305)):
            Circle(SKETCH_1_R_2, mode=Mode.SUBTRACT)
        with Locations((-14.962487977, 7.996493589)):
            Circle(SKETCH_1_R_3, mode=Mode.SUBTRACT)
        with Locations((-5.462487977, -1.503506411)):
            Circle(SKETCH_1_R_3, mode=Mode.SUBTRACT)
        with Locations((-14.962487977, -11.003506411)):
            Circle(SKETCH_1_R_3, mode=Mode.SUBTRACT)
        with Locations((-24.462487977, -1.503506411)):
            Circle(SKETCH_1_R_3, mode=Mode.SUBTRACT)
    extrude(amount=EXTRUDE_2_DEPTH)

    # 草图4 → 凸台-拉伸3 (add)
    with BuildSketch(Plane.XY.offset(4)):
        with Locations((-14.962487977, -64.503506411)):
            Rectangle(SKETCH_4_W, SKETCH_4_H)
    extrude(amount=-EXTRUDE_3_DEPTH)

    # 草图5 → 切除-拉伸1 (cut)
    with BuildSketch(Plane.XY.offset(4)):
        Polygon((-60.962487977, -4.353506411), (-59.762487977, -4.353506411), (-60.962487977, -5.553506411), align=None)
        Polygon((-60.962487977, -12.353506411), (-59.762487977, -12.353506411), (-60.962487977, -11.153506411), align=None)
        Polygon((-60.962487977, -34.353506411), (-59.762487977, -34.353506411), (-60.962487977, -35.553506411), align=None)
        Polygon((-60.962487977, -42.353506411), (-59.762487977, -42.353506411), (-60.962487977, -41.153506411), align=None)
        Polygon((31.037512023, -42.353506411), (31.037512023, -41.153506411), (29.837512023, -42.353506411), align=None)
        Polygon((29.837512023, -34.353506411), (31.037512023, -34.353506411), (31.037512023, -35.553506411), align=None)
        Polygon((31.037512023, -12.353506411), (29.837512023, -12.353506411), (31.037512023, -11.153506411), align=None)
        Polygon((31.037512023, -4.353506411), (29.837512023, -4.353506411), (31.037512023, -5.553506411), align=None)
    extrude(amount=-CUT_EXTRUDE_1_DEPTH, mode=Mode.SUBTRACT)


solid = part.part
